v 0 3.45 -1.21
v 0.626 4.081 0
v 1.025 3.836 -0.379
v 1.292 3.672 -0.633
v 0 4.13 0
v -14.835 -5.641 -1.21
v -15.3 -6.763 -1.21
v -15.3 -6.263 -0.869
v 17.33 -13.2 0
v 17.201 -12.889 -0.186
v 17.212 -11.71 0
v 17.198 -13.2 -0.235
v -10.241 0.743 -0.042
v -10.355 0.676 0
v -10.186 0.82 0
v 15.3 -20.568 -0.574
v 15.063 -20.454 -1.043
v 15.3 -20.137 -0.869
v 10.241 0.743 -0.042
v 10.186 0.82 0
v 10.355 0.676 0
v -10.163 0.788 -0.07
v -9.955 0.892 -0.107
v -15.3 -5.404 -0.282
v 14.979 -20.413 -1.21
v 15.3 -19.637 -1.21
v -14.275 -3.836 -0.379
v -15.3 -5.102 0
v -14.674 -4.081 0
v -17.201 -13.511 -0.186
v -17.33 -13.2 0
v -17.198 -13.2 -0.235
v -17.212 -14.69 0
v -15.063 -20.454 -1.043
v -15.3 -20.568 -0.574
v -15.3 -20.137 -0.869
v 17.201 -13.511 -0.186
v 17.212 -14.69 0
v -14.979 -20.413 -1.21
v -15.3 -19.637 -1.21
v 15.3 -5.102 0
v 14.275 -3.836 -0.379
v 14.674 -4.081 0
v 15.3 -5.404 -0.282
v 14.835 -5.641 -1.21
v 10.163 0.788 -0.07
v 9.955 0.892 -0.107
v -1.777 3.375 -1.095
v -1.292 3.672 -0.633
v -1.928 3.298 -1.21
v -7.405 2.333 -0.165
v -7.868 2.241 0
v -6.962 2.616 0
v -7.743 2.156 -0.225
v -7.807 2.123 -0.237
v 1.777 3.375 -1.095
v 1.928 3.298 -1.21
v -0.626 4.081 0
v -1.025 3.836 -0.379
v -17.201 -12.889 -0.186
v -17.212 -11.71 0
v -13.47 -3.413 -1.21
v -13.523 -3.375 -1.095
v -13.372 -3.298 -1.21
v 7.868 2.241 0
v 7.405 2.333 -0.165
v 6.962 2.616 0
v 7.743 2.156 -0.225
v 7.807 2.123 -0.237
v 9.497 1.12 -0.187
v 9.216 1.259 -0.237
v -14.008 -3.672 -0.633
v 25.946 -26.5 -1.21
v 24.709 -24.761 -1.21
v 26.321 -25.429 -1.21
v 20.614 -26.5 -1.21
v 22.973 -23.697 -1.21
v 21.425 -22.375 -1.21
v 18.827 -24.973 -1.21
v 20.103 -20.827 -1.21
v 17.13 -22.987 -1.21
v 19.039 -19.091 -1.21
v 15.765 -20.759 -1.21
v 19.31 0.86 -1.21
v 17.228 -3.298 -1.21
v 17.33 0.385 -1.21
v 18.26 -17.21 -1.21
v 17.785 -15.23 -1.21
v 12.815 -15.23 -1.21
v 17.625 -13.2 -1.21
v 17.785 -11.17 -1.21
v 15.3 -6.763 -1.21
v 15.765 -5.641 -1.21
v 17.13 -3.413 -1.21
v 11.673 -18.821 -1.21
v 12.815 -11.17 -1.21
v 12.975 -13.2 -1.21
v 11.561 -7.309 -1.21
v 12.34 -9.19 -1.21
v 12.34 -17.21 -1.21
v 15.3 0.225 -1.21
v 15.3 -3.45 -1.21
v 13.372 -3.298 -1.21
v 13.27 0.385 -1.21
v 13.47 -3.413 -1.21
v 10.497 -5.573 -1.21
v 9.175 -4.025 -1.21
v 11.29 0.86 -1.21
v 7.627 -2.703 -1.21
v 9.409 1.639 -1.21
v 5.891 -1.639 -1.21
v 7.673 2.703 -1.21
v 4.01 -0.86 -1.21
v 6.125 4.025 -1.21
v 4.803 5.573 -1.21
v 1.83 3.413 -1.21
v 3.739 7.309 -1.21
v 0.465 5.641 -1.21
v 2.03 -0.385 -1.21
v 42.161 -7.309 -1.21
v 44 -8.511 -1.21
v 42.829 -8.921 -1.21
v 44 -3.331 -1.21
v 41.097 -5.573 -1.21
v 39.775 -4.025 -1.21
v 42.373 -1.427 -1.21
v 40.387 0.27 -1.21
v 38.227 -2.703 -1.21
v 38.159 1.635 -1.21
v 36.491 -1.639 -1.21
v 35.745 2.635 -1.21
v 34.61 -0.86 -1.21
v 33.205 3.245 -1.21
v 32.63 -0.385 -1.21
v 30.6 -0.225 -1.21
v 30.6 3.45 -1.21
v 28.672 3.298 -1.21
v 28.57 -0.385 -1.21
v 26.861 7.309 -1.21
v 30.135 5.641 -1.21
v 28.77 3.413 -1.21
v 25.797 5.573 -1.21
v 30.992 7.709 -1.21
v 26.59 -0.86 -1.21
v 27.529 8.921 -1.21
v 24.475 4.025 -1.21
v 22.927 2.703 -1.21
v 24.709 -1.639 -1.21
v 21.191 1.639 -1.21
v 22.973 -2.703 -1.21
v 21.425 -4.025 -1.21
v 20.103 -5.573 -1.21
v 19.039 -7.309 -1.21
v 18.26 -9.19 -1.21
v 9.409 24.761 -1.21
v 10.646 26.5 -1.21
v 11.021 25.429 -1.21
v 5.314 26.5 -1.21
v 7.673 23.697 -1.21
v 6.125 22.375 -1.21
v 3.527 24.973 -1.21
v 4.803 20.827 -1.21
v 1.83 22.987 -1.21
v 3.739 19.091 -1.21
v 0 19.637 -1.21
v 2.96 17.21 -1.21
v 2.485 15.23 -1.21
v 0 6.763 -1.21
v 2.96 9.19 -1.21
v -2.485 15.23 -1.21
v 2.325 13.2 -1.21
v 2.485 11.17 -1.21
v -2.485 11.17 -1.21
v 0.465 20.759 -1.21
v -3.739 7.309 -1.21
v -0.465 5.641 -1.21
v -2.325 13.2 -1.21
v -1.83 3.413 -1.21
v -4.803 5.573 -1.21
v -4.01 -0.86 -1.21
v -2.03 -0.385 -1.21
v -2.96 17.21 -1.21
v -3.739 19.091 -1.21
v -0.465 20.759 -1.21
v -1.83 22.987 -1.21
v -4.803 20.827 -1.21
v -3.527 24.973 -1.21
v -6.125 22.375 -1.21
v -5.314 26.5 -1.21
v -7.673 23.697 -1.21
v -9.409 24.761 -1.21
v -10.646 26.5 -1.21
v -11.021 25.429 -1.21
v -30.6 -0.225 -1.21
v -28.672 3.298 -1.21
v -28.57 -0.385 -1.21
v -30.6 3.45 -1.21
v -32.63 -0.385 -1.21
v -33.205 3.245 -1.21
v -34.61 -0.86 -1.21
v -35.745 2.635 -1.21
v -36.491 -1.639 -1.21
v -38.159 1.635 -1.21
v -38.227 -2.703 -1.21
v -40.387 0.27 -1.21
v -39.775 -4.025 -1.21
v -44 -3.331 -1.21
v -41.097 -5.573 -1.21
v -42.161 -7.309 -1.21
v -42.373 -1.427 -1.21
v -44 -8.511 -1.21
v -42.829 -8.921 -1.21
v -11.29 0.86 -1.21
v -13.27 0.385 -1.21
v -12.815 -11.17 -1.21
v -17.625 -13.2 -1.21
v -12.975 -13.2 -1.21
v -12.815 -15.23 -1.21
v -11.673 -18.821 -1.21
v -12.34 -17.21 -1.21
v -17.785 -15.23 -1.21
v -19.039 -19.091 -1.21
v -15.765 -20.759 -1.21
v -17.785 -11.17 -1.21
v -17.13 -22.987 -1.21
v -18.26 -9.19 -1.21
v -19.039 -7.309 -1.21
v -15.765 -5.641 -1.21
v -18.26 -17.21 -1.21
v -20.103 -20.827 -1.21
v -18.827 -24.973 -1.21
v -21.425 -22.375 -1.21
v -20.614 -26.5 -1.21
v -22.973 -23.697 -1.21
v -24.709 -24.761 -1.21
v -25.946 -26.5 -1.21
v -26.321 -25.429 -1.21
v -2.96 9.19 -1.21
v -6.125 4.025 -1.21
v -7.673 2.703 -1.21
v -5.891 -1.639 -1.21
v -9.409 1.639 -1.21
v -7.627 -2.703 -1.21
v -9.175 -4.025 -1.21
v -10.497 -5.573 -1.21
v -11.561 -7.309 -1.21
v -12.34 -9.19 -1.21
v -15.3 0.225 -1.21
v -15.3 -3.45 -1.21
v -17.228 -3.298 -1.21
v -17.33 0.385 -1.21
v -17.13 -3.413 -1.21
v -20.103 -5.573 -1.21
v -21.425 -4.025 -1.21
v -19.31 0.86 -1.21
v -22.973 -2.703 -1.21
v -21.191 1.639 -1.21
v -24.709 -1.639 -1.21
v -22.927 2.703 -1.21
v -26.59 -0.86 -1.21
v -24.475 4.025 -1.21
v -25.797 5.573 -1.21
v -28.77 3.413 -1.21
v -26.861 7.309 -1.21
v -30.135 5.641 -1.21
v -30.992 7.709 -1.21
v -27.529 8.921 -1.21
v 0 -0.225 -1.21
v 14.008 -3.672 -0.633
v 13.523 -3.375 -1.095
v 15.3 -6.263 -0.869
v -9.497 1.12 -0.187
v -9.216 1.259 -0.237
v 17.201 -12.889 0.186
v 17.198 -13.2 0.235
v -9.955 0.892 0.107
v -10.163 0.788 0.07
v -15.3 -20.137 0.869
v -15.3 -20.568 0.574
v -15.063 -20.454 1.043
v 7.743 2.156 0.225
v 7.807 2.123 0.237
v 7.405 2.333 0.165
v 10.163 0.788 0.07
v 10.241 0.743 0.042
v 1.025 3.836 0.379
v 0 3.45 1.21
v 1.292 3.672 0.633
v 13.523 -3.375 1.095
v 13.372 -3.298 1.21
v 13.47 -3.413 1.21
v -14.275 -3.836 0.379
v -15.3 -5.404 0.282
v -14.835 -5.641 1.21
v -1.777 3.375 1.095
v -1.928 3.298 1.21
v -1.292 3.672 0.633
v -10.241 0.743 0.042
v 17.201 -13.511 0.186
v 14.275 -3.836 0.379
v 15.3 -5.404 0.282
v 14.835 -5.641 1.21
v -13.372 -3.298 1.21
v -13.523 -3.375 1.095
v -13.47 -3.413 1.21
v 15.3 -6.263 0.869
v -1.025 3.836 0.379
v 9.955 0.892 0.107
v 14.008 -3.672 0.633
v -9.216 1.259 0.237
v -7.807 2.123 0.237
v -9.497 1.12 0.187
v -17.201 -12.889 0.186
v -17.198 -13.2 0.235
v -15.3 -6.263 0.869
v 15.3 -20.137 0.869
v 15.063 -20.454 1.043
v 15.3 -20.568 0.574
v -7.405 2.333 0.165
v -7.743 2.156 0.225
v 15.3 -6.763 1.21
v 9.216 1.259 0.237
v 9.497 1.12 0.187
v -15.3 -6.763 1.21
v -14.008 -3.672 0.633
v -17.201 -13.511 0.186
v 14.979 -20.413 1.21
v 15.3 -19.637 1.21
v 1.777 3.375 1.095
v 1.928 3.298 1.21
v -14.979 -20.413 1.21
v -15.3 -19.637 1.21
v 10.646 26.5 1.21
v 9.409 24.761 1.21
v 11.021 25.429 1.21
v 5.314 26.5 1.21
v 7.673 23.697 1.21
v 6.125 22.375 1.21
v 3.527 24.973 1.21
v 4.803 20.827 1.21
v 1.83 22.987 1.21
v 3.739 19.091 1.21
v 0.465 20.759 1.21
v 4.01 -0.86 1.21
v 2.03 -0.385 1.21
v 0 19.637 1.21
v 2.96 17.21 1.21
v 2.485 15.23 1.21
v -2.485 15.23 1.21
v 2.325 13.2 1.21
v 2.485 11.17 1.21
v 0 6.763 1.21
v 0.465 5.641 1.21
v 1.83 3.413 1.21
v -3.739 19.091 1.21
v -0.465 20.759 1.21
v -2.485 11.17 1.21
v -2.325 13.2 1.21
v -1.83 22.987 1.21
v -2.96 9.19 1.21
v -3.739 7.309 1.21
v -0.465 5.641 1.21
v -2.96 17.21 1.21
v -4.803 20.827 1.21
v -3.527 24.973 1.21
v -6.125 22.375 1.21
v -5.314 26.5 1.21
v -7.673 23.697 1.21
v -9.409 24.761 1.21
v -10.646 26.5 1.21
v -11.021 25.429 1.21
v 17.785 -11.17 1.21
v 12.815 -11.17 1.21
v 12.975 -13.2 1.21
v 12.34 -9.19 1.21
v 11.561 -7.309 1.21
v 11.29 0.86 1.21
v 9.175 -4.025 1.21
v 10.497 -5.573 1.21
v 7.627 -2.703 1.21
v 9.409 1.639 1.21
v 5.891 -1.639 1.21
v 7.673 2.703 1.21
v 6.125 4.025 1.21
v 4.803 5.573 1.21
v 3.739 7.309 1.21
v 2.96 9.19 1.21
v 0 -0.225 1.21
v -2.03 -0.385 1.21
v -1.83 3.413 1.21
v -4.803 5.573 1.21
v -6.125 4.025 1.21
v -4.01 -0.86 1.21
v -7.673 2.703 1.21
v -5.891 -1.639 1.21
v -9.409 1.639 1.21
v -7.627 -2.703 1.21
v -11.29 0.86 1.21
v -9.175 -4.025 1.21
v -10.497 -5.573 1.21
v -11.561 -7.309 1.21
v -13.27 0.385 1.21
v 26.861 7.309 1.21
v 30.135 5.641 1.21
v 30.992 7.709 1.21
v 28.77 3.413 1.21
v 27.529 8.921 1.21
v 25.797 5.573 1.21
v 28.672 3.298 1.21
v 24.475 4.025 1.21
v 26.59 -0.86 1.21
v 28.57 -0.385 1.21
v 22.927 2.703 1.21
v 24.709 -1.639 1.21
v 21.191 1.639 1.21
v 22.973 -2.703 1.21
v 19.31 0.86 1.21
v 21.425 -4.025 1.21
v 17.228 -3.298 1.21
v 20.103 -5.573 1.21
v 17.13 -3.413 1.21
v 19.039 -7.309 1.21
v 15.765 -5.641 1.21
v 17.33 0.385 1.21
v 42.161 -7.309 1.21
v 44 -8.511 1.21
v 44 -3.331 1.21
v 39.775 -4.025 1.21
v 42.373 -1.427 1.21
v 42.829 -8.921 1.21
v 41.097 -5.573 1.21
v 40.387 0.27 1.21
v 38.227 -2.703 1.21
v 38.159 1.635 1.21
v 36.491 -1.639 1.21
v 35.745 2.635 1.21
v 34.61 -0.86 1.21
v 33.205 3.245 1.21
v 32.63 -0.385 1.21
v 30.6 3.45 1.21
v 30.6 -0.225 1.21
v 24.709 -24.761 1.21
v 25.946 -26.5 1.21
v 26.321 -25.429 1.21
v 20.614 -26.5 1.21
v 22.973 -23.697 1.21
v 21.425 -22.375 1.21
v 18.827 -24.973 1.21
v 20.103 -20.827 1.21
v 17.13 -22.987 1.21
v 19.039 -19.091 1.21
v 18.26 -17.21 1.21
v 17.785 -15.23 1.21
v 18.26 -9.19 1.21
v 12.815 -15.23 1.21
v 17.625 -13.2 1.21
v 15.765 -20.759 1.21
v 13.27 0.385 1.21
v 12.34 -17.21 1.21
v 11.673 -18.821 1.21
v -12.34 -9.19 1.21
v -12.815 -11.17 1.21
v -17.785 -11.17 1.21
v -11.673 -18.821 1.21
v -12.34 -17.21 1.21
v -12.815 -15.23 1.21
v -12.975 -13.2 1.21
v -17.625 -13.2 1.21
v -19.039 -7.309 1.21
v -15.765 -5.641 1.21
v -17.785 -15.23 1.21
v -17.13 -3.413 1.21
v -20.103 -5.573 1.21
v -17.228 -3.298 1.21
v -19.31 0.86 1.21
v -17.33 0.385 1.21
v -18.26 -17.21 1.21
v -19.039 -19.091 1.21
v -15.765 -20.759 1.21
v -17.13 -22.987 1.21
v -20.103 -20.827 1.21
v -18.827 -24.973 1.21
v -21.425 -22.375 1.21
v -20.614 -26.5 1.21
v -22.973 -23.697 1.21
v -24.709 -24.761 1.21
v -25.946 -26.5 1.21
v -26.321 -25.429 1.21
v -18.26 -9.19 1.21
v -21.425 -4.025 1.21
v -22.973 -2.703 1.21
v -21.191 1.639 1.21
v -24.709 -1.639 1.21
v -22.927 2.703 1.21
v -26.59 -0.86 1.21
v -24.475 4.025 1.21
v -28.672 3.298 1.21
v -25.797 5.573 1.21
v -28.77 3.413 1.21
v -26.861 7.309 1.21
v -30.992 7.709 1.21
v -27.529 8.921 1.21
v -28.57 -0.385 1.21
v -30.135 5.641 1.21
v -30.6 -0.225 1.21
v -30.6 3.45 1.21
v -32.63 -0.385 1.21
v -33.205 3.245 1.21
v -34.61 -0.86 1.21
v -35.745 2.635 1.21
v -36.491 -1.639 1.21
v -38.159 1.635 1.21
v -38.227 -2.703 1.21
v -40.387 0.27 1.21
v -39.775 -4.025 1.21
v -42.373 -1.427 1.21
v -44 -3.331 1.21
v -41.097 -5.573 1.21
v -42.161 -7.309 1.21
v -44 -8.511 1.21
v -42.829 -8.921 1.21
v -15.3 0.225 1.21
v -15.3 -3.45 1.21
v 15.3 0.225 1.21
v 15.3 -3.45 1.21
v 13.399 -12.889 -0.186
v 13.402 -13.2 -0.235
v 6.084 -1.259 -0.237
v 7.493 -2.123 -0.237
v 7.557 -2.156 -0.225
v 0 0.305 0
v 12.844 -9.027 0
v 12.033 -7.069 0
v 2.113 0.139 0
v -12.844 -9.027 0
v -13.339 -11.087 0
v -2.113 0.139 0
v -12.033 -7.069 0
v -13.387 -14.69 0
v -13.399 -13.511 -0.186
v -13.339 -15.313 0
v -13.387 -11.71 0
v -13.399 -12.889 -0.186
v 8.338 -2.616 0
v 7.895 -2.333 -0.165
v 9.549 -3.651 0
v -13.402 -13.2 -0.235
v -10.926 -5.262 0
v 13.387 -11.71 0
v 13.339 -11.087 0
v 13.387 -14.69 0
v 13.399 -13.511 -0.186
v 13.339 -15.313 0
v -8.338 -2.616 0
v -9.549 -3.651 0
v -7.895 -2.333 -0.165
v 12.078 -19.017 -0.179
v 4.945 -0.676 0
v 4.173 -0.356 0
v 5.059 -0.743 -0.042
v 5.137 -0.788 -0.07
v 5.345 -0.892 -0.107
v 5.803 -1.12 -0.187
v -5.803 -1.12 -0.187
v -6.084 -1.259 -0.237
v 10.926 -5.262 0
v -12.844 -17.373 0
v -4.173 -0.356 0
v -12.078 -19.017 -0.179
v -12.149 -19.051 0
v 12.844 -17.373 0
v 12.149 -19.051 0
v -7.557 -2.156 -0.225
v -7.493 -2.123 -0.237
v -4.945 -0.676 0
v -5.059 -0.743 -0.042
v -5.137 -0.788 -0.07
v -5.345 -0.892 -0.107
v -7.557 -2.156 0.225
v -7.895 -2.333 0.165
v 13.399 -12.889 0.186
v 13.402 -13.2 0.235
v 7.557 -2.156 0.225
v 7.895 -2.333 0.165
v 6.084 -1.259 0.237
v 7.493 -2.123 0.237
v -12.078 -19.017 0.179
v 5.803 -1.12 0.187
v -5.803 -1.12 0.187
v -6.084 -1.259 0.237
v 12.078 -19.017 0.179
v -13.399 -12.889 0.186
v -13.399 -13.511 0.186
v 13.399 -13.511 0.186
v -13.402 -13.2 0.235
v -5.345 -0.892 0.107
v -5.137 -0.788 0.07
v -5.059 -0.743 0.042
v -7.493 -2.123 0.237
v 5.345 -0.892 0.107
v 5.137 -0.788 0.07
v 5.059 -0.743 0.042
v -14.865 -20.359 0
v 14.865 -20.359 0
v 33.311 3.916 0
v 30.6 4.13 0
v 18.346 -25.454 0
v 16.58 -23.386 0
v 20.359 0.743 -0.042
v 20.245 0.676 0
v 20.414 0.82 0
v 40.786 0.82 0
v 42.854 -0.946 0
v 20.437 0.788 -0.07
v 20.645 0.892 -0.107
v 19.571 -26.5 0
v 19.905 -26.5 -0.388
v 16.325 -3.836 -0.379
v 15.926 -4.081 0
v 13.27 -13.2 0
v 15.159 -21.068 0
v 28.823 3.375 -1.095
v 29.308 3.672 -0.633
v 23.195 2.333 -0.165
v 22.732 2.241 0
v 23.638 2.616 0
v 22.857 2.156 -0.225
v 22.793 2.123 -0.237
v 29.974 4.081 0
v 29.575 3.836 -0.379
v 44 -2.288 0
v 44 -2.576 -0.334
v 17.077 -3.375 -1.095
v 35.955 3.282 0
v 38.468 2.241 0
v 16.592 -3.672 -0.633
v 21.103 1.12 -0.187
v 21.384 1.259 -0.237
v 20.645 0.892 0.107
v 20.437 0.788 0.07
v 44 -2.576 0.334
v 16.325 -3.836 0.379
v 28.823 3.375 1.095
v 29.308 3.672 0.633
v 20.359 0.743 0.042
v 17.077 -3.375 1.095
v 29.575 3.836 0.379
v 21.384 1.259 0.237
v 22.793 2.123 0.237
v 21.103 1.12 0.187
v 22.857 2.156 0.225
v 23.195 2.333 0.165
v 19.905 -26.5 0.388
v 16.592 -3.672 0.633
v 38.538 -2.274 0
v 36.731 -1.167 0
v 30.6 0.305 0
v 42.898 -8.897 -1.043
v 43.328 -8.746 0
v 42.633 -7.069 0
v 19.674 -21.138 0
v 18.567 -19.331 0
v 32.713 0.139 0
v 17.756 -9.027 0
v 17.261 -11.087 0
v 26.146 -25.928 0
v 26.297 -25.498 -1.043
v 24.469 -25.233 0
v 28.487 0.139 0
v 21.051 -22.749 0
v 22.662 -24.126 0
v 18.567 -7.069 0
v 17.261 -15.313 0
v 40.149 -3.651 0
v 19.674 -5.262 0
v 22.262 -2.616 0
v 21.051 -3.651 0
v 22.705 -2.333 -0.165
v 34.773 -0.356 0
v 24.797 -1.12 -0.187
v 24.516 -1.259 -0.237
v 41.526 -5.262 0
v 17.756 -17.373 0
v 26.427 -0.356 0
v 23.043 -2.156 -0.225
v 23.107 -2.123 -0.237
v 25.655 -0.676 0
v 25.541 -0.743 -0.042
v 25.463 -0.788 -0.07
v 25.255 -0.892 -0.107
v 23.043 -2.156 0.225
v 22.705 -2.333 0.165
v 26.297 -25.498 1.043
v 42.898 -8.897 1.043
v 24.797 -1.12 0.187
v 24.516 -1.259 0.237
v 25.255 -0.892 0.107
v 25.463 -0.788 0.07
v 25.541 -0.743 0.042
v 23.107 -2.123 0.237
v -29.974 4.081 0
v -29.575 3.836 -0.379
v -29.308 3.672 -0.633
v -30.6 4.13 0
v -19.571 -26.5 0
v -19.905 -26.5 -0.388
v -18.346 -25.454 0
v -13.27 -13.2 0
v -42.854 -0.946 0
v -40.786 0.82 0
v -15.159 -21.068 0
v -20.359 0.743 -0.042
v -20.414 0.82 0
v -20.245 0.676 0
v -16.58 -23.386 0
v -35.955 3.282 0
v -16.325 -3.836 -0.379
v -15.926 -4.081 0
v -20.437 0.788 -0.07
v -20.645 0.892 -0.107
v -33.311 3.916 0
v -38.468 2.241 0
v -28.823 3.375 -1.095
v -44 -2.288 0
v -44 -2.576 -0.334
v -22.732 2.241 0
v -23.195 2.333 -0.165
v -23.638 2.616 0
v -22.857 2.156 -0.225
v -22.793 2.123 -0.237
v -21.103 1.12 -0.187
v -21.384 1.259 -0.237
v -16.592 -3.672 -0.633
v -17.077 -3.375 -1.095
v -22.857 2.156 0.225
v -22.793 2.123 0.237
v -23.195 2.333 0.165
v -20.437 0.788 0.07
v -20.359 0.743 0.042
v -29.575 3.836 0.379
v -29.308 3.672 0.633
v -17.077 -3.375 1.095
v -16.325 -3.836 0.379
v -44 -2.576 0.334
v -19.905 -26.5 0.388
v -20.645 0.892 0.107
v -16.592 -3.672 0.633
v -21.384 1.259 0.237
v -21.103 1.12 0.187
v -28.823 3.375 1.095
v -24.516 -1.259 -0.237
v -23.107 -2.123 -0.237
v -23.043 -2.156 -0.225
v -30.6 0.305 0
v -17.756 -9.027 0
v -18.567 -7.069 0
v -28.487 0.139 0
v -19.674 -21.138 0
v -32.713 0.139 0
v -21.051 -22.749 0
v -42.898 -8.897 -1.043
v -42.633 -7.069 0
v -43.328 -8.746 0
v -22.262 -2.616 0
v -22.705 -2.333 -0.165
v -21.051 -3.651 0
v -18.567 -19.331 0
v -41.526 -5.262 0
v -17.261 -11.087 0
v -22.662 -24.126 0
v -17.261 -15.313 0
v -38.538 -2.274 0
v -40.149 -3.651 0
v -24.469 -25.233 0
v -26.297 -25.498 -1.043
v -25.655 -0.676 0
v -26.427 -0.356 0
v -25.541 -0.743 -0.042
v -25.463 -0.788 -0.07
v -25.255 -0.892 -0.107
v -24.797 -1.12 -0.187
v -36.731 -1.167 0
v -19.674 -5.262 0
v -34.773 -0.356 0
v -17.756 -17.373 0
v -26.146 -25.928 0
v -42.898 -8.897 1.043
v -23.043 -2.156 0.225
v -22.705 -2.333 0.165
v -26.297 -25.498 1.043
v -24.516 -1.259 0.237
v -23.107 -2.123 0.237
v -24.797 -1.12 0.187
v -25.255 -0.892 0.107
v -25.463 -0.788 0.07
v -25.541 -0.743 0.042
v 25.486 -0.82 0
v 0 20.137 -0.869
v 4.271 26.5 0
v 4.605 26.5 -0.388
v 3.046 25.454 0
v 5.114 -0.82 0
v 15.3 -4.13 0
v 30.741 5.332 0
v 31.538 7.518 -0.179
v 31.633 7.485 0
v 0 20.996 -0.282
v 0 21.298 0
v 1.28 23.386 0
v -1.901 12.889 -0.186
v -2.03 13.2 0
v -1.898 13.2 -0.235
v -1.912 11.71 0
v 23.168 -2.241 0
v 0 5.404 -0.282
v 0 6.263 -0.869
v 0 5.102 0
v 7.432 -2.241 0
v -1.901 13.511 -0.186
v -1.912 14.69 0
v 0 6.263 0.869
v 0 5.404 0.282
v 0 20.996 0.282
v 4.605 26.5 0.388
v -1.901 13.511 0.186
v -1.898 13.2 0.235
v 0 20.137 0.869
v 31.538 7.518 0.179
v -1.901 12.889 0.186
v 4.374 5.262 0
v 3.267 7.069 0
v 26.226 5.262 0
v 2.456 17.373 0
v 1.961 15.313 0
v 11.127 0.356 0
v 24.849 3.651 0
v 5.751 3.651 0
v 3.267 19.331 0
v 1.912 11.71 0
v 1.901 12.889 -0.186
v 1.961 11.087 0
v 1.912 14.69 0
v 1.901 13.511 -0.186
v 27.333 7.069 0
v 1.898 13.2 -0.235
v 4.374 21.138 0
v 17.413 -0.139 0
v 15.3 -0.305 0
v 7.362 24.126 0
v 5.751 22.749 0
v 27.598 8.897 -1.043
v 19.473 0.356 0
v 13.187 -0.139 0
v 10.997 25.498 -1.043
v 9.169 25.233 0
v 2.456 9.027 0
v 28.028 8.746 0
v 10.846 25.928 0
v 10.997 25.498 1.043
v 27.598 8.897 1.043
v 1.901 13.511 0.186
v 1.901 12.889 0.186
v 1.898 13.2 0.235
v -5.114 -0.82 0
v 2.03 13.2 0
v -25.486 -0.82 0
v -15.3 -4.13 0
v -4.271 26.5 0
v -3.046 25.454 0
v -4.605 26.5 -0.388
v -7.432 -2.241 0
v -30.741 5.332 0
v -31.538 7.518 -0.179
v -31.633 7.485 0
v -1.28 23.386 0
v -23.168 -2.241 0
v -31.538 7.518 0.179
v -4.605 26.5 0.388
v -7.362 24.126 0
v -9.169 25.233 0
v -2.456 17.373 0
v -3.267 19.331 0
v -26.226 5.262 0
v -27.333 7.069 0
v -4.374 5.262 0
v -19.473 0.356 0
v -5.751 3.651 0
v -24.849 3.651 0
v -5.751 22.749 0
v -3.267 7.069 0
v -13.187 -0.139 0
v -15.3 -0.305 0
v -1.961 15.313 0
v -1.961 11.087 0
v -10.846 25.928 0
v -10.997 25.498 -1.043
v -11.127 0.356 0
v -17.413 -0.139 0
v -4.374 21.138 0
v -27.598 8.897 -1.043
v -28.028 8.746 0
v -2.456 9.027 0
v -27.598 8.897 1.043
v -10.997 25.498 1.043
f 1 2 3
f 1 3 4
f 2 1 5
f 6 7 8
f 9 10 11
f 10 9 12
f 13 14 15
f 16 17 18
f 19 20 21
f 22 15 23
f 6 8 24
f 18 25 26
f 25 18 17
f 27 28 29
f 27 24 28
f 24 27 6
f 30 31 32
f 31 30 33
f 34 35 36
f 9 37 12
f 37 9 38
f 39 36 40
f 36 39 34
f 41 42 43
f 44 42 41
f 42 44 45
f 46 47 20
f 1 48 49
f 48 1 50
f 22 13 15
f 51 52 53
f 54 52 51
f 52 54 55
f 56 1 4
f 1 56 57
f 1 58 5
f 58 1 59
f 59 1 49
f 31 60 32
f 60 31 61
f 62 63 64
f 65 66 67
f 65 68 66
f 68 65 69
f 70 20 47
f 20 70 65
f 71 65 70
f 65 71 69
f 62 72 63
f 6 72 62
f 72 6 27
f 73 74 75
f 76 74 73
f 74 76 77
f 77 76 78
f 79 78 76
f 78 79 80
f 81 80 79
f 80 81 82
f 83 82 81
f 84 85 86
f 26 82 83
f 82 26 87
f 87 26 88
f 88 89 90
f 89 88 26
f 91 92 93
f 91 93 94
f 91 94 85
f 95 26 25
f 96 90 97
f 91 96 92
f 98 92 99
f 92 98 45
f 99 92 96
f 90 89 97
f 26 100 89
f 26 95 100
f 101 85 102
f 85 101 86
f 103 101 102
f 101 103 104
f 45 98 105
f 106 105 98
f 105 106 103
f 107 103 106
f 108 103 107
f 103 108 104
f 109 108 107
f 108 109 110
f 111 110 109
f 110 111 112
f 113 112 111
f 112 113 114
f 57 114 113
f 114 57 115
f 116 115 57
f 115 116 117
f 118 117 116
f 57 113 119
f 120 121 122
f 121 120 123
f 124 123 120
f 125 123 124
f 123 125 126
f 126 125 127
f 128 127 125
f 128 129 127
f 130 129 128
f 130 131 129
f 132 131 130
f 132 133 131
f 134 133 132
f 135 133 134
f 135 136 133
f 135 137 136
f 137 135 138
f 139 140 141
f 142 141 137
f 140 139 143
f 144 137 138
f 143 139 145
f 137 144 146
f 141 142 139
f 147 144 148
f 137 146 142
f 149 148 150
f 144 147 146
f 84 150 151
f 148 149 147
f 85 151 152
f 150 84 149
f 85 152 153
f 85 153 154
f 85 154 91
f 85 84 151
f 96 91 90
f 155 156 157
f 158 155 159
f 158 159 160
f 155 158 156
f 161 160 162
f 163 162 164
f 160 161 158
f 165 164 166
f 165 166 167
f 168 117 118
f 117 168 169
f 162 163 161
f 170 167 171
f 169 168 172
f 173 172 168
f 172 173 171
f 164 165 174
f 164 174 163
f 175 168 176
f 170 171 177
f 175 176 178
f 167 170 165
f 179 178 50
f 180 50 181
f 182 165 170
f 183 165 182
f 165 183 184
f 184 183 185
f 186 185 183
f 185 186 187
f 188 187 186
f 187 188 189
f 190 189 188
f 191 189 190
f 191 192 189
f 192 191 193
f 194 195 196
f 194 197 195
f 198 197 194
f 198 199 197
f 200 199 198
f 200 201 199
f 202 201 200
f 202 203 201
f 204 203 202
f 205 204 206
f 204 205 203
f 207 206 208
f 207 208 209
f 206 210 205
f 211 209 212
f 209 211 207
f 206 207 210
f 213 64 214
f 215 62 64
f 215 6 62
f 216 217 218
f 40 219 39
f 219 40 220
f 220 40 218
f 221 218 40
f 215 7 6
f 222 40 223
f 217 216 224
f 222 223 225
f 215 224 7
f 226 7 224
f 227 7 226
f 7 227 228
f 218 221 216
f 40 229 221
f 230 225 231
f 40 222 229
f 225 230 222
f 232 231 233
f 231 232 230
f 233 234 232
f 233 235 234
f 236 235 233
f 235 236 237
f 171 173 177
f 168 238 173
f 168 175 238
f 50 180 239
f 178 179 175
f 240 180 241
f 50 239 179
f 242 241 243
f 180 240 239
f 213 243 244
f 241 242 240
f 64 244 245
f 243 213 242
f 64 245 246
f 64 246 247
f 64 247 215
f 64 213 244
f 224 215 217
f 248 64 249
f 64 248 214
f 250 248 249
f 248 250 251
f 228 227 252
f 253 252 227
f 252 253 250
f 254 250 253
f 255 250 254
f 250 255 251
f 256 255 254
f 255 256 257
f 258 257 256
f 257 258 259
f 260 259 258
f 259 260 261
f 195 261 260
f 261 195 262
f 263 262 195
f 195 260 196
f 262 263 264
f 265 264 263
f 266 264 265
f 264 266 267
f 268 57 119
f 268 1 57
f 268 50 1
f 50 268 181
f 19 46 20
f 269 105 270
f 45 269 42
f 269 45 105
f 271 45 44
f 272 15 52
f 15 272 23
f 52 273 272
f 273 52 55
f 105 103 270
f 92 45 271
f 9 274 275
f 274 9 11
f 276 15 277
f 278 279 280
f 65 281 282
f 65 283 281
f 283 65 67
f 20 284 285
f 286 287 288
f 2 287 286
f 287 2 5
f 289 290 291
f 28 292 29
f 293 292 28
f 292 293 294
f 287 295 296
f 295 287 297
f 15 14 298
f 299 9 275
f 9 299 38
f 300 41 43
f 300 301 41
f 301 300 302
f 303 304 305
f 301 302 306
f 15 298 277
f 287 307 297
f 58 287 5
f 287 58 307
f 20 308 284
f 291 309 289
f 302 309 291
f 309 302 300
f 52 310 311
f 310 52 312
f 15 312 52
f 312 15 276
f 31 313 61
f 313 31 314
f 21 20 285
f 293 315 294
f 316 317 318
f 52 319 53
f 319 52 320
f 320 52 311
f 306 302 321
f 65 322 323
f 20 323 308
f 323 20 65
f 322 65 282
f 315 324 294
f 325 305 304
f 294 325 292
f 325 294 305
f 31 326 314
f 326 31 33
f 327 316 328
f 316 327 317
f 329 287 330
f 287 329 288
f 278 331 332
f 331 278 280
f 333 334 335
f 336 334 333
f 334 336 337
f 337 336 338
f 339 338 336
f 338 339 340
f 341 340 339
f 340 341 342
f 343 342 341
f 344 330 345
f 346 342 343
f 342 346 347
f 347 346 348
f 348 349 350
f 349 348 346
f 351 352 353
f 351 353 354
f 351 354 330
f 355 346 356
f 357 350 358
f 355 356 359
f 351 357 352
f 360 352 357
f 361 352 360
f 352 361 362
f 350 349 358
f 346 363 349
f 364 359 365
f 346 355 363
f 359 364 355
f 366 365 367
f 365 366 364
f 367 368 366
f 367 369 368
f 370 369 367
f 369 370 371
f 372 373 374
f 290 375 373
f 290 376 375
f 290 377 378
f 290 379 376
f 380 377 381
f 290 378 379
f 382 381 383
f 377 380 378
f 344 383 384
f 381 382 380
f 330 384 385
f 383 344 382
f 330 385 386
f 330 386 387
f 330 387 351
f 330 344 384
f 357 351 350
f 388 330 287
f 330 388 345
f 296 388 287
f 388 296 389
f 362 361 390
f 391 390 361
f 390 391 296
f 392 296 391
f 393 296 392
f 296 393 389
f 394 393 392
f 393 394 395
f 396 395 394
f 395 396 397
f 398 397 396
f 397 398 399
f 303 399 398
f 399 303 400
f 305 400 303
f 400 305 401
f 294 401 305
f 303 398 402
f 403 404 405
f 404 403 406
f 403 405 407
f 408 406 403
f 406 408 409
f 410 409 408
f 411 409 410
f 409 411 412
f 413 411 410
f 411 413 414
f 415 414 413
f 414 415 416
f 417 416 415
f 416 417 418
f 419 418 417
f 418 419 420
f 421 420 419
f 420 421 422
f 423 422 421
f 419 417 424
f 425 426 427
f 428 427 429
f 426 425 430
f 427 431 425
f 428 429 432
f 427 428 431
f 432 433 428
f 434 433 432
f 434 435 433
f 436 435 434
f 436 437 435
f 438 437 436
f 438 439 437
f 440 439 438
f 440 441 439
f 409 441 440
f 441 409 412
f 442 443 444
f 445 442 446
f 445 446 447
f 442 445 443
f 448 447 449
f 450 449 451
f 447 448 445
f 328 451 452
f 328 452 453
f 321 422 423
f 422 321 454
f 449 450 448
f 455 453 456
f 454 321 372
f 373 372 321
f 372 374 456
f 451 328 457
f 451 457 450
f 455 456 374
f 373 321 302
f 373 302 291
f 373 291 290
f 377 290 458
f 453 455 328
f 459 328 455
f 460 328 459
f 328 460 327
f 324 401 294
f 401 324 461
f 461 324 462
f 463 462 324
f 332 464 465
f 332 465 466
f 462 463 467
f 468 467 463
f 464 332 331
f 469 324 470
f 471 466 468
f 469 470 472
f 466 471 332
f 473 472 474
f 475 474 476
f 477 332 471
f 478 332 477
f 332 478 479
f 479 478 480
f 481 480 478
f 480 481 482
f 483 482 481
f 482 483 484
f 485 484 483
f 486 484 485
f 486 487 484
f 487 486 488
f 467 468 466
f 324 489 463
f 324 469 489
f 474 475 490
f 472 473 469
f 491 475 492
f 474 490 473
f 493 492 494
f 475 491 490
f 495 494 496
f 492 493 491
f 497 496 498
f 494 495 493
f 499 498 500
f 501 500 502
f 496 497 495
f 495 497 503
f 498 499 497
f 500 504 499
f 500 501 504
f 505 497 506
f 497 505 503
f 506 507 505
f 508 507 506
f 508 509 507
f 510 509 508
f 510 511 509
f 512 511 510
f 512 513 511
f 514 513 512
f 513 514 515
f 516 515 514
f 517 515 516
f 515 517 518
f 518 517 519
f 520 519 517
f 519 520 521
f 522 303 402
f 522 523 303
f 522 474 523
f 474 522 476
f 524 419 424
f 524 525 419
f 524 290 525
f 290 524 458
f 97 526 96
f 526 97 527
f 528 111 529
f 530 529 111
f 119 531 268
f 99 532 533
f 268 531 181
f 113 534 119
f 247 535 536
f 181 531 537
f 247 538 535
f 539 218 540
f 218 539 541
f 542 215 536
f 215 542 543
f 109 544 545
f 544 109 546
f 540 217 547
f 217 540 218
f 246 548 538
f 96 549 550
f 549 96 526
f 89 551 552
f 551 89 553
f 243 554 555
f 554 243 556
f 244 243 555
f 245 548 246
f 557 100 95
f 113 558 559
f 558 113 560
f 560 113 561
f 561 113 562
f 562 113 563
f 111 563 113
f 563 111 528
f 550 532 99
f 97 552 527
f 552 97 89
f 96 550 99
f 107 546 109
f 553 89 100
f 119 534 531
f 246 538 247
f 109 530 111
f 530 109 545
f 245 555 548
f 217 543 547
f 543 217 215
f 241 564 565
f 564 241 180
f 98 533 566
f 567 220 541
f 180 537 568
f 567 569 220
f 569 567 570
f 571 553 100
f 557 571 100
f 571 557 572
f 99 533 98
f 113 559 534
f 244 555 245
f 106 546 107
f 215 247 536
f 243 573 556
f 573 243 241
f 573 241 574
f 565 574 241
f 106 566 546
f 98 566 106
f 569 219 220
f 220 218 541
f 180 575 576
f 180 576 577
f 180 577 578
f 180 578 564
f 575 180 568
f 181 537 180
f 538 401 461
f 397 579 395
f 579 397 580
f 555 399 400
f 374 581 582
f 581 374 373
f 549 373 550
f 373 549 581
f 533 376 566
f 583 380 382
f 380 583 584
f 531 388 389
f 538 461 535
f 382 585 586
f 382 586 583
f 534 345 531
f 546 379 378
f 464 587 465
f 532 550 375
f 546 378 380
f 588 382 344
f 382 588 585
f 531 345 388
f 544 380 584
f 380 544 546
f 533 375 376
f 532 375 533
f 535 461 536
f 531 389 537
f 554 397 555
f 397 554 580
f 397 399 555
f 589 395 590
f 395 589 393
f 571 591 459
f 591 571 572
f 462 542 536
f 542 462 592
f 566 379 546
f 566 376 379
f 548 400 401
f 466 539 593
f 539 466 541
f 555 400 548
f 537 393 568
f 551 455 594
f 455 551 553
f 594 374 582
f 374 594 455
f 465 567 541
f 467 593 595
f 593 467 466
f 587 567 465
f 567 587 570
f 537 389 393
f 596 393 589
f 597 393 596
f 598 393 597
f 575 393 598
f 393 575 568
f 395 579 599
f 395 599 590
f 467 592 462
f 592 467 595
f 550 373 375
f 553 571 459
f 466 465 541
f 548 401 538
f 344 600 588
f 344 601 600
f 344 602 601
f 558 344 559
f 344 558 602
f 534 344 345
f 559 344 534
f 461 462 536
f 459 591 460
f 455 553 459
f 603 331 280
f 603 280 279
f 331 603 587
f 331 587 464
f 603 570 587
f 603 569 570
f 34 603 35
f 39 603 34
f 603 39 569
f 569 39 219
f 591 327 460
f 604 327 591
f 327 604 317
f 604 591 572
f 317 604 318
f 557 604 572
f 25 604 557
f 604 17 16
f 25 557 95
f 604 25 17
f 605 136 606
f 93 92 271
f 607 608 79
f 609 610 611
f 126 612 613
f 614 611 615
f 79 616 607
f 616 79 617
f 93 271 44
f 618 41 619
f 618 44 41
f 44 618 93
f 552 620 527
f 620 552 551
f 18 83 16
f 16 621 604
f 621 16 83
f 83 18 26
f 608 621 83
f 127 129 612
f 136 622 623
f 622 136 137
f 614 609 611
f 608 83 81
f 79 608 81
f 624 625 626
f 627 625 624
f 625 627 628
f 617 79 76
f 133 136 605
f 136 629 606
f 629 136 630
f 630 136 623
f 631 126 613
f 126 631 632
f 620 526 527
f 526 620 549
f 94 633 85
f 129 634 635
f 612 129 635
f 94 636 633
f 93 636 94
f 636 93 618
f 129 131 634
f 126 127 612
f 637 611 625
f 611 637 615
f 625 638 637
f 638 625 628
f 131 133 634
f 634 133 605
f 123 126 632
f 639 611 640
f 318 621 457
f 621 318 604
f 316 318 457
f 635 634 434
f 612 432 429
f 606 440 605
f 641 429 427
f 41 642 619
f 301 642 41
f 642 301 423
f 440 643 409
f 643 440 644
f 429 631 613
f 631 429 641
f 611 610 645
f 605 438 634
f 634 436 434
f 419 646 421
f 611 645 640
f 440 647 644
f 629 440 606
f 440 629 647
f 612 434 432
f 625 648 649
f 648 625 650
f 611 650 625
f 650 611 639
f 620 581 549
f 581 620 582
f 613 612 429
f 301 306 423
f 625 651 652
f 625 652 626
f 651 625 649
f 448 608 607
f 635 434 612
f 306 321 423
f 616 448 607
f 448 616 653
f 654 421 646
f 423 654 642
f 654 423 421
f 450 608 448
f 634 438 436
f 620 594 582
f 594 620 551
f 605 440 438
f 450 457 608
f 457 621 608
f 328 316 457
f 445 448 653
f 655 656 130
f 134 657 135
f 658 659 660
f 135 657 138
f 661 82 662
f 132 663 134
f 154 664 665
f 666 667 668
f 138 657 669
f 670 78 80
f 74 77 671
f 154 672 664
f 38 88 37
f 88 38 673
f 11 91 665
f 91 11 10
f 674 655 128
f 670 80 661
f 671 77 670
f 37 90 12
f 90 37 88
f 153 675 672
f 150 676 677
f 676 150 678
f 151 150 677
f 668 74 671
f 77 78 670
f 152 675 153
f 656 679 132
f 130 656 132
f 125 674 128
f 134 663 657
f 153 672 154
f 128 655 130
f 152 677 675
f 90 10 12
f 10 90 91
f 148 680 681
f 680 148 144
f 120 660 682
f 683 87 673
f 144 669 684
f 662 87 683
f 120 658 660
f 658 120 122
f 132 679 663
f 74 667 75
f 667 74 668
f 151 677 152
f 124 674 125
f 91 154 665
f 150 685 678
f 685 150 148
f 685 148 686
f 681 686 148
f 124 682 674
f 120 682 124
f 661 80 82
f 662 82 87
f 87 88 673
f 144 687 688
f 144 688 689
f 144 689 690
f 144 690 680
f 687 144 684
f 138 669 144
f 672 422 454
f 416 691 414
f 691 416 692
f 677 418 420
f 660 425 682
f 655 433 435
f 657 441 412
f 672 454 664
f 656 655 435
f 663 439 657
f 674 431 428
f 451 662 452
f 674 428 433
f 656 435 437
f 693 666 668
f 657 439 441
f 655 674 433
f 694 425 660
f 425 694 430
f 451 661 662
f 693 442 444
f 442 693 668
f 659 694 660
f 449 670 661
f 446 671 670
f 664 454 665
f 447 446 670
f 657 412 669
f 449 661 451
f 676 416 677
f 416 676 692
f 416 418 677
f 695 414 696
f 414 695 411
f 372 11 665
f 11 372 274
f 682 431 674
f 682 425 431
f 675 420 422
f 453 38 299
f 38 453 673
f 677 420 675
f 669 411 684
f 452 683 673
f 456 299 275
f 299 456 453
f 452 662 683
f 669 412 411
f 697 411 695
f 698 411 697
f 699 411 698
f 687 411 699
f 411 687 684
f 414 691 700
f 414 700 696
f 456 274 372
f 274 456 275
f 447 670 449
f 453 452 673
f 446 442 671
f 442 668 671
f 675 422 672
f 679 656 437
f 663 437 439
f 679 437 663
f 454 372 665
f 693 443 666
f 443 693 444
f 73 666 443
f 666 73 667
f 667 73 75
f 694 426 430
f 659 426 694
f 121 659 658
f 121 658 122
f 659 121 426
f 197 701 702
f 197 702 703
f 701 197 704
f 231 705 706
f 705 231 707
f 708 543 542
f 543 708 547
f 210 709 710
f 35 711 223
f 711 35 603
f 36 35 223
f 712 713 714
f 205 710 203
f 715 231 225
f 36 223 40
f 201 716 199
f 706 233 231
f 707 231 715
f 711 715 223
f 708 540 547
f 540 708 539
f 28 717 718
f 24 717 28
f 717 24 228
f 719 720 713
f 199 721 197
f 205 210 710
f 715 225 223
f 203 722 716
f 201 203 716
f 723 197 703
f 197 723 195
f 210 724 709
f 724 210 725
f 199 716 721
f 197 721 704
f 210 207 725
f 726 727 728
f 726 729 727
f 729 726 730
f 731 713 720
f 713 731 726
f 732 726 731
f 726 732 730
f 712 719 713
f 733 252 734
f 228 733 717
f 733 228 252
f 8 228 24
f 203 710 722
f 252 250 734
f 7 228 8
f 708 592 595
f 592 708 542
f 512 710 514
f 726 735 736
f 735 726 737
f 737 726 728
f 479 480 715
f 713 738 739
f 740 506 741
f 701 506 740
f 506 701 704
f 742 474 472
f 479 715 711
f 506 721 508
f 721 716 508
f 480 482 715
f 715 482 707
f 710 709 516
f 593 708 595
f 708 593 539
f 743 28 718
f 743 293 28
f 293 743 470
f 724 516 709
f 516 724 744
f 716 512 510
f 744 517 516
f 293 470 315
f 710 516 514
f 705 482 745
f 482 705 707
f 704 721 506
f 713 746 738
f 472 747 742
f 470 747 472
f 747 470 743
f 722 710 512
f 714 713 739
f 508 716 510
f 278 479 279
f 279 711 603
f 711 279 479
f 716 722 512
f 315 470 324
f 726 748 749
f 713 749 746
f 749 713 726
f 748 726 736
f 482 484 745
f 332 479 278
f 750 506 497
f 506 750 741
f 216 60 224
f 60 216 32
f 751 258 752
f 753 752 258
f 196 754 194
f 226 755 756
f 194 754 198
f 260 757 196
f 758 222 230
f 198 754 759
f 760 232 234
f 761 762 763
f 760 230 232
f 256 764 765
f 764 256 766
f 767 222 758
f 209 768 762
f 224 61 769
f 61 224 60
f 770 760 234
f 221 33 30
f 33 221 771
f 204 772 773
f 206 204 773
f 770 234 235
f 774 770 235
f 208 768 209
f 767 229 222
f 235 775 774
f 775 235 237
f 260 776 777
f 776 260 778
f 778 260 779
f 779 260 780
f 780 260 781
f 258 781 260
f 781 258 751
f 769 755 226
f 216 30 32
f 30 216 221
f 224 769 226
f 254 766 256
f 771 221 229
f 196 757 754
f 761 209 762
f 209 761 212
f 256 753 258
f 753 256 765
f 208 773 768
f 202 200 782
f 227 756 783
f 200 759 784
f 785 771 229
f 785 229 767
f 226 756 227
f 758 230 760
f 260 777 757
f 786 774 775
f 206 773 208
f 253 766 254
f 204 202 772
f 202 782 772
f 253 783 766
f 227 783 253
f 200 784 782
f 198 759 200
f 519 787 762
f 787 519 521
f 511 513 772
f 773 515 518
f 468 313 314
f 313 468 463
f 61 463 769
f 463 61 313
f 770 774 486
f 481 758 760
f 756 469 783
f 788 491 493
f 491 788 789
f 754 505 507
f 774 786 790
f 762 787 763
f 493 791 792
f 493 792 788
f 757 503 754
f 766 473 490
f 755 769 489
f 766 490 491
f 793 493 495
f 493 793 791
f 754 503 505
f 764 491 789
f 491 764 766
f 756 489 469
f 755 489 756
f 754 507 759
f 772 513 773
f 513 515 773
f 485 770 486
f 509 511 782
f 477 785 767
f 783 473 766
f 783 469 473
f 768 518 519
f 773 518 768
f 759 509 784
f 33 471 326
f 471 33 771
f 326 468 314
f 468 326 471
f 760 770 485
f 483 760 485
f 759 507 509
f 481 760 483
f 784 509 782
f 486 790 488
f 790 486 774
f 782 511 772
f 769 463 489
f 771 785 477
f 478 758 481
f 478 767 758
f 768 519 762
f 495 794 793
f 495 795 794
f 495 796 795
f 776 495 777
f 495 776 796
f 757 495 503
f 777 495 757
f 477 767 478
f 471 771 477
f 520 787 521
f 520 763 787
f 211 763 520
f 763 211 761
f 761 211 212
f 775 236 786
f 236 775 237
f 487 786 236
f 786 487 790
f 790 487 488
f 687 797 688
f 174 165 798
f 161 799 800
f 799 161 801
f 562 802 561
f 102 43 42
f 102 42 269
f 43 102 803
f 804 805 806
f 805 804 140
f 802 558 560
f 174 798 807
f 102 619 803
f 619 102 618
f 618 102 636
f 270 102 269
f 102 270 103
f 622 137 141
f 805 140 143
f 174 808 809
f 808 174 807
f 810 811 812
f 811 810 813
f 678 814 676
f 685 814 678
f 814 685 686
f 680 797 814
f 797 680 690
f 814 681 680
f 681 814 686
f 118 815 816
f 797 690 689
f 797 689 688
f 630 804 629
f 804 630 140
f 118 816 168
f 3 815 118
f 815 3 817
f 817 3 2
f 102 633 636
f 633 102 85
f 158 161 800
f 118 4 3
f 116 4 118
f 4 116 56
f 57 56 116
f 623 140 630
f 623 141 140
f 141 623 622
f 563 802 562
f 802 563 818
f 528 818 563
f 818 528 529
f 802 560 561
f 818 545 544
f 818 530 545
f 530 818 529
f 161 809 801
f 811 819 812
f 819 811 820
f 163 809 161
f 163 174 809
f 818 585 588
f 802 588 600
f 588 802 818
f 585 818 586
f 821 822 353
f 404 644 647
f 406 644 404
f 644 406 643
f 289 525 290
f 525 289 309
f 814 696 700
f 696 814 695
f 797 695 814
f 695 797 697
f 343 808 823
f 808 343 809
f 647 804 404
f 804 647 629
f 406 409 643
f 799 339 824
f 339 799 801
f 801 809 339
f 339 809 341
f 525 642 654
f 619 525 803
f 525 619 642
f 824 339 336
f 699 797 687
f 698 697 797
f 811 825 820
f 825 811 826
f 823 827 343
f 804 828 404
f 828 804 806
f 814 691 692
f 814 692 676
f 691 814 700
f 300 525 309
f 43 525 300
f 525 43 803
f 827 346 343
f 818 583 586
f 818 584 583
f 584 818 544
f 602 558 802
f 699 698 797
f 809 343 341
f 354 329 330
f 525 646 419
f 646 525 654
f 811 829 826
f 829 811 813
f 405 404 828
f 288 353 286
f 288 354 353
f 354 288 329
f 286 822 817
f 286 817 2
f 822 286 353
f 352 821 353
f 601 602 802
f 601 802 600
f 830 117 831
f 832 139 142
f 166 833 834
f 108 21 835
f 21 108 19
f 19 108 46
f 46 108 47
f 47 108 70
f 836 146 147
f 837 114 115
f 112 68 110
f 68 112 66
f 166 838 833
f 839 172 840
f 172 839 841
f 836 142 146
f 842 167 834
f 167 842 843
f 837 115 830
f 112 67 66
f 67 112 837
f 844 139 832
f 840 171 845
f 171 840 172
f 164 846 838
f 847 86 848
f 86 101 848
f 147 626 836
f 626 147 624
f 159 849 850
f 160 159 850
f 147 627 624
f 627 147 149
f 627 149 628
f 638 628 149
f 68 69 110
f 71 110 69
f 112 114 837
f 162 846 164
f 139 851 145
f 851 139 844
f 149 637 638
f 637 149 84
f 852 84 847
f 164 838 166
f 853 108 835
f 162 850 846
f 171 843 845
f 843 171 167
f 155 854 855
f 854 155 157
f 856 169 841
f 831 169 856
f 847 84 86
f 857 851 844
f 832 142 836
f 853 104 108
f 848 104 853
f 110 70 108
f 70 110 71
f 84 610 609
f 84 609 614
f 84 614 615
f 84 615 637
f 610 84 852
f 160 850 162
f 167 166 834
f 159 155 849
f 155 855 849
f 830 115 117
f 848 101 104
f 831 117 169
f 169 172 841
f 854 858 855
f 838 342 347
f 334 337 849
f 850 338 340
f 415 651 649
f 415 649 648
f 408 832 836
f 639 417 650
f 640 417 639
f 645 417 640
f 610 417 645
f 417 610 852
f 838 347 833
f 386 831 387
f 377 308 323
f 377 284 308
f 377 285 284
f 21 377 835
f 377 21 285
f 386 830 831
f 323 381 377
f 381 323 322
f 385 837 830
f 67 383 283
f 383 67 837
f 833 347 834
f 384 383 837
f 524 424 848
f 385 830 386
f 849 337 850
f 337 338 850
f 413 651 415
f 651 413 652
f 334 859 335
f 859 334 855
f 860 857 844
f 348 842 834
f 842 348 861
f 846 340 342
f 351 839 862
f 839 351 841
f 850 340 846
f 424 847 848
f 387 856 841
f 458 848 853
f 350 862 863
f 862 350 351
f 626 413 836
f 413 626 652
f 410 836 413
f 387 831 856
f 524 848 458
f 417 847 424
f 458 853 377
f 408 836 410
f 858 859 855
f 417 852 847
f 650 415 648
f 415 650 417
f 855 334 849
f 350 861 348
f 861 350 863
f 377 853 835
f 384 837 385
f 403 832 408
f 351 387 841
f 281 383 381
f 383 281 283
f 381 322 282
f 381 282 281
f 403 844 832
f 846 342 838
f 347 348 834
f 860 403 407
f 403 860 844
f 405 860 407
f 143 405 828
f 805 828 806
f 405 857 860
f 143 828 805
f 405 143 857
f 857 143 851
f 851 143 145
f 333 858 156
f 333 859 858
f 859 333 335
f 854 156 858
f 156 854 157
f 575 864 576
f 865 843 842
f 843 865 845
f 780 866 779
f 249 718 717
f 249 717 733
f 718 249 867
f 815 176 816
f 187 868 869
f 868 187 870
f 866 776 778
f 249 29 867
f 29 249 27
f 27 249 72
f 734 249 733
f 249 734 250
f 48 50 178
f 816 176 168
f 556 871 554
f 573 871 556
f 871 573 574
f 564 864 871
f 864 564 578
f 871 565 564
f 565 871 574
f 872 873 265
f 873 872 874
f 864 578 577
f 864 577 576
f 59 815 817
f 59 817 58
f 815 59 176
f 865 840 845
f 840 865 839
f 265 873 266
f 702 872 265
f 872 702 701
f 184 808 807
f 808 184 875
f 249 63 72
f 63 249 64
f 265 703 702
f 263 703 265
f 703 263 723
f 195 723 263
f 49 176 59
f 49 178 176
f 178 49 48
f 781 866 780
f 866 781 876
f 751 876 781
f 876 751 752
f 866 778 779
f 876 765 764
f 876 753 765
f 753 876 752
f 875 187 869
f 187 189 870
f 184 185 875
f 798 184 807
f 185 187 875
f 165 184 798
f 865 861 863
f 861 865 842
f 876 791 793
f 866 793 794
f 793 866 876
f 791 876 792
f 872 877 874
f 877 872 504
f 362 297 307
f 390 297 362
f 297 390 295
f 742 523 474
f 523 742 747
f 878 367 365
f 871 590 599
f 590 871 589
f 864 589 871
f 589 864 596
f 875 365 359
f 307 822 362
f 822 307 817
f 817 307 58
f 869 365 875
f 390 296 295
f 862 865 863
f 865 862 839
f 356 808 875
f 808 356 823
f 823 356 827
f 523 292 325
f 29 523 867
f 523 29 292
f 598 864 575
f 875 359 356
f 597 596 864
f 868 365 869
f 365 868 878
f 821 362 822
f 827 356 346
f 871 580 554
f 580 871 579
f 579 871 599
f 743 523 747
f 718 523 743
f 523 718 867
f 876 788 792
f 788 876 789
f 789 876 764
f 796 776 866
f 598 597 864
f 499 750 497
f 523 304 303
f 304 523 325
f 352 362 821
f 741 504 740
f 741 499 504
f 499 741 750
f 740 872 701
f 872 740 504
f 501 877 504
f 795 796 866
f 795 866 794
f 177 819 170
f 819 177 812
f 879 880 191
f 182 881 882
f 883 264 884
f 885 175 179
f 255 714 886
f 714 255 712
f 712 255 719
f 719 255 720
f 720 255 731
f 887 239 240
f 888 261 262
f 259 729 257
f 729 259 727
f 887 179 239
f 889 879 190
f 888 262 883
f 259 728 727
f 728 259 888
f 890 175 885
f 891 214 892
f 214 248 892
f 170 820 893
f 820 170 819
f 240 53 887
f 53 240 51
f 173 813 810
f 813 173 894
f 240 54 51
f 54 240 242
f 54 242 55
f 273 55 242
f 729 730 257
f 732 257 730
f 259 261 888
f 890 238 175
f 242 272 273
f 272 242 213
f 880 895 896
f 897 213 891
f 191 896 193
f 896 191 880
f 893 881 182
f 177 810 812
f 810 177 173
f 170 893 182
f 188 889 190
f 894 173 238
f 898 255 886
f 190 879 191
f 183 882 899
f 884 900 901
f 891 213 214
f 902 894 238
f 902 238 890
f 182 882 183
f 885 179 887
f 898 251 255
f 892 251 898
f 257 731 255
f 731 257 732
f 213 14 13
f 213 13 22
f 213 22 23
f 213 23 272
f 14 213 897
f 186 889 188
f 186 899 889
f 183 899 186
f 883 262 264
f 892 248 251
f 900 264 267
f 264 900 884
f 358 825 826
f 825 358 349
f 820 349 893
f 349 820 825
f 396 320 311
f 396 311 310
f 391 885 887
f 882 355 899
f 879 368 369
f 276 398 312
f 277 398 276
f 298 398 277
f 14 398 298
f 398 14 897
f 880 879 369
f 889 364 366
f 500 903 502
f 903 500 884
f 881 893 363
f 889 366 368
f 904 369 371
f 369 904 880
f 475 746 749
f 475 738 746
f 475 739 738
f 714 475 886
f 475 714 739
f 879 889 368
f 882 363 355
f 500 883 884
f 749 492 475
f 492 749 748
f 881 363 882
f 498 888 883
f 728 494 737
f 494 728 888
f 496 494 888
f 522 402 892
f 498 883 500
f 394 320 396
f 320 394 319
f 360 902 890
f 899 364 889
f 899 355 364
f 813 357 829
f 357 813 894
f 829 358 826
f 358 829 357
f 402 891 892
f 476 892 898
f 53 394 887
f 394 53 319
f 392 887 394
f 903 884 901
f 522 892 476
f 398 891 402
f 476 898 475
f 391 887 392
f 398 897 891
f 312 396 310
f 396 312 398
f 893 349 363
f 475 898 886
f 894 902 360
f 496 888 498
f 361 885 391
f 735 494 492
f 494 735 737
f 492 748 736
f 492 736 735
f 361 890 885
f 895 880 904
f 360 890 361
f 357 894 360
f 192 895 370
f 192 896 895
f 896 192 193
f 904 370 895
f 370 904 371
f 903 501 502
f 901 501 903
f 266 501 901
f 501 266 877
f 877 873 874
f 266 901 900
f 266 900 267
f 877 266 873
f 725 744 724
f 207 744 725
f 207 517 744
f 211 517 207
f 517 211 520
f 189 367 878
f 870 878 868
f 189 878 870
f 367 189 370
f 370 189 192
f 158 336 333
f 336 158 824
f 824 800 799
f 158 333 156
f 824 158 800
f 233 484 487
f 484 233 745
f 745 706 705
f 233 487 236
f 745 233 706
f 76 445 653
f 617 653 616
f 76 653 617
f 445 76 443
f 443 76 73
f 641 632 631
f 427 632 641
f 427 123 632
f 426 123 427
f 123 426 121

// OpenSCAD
Length=88; //Credit Card Size
Width=53; //Credit Card Size
NDia=21.19; //Canadian Nickle Diameter
NThick=1.81; //Canadian Nickle Thickness
DDia=18.01; //Canadian Dime Thickness
DThick=1.19; //Canadian Dime Thickness
QDia=23.88; //Canadian Quarter Thickness
QThick=1.58; //Canadian Quarter Thickness
LDia=26.48; //Canadian Loonie Diameter
LThick=1.92; //Candian Loonie Thickness
TDia=27.94; //Candian Toonie Diameter
TThick=1.67; //Candian Toonie Thickness
WallWidth=3.75; //Hub Thickness for flexibimty and strength
Thickness=LThick+0.5; //0.5mm thicker than thickest coin
$fn=40;


module CoinHole(Diameter){
	translate([0,0,-Thickness/2])cylinder(r1=Diameter*0.49,r2=Diameter*.51,h=Thickness/2);
	translate([0,0,0])cylinder(r1=Diameter*0.51,r2=Diameter*.49,h=Thickness/2);
	cylinder(r=Diameter*.49,h=Thickness*2,center=true);
}
module OutCoinHole(Diameter){
	translate([0,0,-Thickness/2])cylinder(r1=Diameter*0.49,r2=Diameter*.51,h=Thickness/2);
	translate([0,0,0])cylinder(r1=Diameter*0.51,r2=Diameter*.49,h=Thickness/2);
	//cylinder(r=Diameter*.49,h=Thickness*2,center=true);
}
module CutOut(Size){
	translate([-Size,0,-Thickness])cylinder(r=Size,h=Thickness*2,$fn=7,center=false);
}
module CoinCircle(XLoc,YLoc,Diameter,Rot){
	difference(){
		translate([XLoc,YLoc,0])OutCoinHole(Diameter+WallWidth*2); //Outside Circle
		translate([XLoc,YLoc,0])CoinHole(Diameter); //Inside Circle
		translate([XLoc,YLoc,0])rotate(a=[0,0,Rot])CutOut(Diameter); //Stress Notch
	}
}

intersection(){
	union(){
		CoinCircle(0,-13.2,LDia,90); //Loonie 1
		CoinCircle(30.6,-13.2,LDia,135); //Loonie 2
		CoinCircle(-30.6,-13.2,LDia,45); //Loonie 3
		CoinCircle(15.3,13.2,LDia,-135); //Loonie 4
		CoinCircle(-15.3,13.2,LDia,-45); //Loonie 5
	}
	minkowski(){
			cube([Length-4,Width-4,Thickness],center=true);
			cylinder(r=2,h=Thickness/2,center=true);
	}
}
